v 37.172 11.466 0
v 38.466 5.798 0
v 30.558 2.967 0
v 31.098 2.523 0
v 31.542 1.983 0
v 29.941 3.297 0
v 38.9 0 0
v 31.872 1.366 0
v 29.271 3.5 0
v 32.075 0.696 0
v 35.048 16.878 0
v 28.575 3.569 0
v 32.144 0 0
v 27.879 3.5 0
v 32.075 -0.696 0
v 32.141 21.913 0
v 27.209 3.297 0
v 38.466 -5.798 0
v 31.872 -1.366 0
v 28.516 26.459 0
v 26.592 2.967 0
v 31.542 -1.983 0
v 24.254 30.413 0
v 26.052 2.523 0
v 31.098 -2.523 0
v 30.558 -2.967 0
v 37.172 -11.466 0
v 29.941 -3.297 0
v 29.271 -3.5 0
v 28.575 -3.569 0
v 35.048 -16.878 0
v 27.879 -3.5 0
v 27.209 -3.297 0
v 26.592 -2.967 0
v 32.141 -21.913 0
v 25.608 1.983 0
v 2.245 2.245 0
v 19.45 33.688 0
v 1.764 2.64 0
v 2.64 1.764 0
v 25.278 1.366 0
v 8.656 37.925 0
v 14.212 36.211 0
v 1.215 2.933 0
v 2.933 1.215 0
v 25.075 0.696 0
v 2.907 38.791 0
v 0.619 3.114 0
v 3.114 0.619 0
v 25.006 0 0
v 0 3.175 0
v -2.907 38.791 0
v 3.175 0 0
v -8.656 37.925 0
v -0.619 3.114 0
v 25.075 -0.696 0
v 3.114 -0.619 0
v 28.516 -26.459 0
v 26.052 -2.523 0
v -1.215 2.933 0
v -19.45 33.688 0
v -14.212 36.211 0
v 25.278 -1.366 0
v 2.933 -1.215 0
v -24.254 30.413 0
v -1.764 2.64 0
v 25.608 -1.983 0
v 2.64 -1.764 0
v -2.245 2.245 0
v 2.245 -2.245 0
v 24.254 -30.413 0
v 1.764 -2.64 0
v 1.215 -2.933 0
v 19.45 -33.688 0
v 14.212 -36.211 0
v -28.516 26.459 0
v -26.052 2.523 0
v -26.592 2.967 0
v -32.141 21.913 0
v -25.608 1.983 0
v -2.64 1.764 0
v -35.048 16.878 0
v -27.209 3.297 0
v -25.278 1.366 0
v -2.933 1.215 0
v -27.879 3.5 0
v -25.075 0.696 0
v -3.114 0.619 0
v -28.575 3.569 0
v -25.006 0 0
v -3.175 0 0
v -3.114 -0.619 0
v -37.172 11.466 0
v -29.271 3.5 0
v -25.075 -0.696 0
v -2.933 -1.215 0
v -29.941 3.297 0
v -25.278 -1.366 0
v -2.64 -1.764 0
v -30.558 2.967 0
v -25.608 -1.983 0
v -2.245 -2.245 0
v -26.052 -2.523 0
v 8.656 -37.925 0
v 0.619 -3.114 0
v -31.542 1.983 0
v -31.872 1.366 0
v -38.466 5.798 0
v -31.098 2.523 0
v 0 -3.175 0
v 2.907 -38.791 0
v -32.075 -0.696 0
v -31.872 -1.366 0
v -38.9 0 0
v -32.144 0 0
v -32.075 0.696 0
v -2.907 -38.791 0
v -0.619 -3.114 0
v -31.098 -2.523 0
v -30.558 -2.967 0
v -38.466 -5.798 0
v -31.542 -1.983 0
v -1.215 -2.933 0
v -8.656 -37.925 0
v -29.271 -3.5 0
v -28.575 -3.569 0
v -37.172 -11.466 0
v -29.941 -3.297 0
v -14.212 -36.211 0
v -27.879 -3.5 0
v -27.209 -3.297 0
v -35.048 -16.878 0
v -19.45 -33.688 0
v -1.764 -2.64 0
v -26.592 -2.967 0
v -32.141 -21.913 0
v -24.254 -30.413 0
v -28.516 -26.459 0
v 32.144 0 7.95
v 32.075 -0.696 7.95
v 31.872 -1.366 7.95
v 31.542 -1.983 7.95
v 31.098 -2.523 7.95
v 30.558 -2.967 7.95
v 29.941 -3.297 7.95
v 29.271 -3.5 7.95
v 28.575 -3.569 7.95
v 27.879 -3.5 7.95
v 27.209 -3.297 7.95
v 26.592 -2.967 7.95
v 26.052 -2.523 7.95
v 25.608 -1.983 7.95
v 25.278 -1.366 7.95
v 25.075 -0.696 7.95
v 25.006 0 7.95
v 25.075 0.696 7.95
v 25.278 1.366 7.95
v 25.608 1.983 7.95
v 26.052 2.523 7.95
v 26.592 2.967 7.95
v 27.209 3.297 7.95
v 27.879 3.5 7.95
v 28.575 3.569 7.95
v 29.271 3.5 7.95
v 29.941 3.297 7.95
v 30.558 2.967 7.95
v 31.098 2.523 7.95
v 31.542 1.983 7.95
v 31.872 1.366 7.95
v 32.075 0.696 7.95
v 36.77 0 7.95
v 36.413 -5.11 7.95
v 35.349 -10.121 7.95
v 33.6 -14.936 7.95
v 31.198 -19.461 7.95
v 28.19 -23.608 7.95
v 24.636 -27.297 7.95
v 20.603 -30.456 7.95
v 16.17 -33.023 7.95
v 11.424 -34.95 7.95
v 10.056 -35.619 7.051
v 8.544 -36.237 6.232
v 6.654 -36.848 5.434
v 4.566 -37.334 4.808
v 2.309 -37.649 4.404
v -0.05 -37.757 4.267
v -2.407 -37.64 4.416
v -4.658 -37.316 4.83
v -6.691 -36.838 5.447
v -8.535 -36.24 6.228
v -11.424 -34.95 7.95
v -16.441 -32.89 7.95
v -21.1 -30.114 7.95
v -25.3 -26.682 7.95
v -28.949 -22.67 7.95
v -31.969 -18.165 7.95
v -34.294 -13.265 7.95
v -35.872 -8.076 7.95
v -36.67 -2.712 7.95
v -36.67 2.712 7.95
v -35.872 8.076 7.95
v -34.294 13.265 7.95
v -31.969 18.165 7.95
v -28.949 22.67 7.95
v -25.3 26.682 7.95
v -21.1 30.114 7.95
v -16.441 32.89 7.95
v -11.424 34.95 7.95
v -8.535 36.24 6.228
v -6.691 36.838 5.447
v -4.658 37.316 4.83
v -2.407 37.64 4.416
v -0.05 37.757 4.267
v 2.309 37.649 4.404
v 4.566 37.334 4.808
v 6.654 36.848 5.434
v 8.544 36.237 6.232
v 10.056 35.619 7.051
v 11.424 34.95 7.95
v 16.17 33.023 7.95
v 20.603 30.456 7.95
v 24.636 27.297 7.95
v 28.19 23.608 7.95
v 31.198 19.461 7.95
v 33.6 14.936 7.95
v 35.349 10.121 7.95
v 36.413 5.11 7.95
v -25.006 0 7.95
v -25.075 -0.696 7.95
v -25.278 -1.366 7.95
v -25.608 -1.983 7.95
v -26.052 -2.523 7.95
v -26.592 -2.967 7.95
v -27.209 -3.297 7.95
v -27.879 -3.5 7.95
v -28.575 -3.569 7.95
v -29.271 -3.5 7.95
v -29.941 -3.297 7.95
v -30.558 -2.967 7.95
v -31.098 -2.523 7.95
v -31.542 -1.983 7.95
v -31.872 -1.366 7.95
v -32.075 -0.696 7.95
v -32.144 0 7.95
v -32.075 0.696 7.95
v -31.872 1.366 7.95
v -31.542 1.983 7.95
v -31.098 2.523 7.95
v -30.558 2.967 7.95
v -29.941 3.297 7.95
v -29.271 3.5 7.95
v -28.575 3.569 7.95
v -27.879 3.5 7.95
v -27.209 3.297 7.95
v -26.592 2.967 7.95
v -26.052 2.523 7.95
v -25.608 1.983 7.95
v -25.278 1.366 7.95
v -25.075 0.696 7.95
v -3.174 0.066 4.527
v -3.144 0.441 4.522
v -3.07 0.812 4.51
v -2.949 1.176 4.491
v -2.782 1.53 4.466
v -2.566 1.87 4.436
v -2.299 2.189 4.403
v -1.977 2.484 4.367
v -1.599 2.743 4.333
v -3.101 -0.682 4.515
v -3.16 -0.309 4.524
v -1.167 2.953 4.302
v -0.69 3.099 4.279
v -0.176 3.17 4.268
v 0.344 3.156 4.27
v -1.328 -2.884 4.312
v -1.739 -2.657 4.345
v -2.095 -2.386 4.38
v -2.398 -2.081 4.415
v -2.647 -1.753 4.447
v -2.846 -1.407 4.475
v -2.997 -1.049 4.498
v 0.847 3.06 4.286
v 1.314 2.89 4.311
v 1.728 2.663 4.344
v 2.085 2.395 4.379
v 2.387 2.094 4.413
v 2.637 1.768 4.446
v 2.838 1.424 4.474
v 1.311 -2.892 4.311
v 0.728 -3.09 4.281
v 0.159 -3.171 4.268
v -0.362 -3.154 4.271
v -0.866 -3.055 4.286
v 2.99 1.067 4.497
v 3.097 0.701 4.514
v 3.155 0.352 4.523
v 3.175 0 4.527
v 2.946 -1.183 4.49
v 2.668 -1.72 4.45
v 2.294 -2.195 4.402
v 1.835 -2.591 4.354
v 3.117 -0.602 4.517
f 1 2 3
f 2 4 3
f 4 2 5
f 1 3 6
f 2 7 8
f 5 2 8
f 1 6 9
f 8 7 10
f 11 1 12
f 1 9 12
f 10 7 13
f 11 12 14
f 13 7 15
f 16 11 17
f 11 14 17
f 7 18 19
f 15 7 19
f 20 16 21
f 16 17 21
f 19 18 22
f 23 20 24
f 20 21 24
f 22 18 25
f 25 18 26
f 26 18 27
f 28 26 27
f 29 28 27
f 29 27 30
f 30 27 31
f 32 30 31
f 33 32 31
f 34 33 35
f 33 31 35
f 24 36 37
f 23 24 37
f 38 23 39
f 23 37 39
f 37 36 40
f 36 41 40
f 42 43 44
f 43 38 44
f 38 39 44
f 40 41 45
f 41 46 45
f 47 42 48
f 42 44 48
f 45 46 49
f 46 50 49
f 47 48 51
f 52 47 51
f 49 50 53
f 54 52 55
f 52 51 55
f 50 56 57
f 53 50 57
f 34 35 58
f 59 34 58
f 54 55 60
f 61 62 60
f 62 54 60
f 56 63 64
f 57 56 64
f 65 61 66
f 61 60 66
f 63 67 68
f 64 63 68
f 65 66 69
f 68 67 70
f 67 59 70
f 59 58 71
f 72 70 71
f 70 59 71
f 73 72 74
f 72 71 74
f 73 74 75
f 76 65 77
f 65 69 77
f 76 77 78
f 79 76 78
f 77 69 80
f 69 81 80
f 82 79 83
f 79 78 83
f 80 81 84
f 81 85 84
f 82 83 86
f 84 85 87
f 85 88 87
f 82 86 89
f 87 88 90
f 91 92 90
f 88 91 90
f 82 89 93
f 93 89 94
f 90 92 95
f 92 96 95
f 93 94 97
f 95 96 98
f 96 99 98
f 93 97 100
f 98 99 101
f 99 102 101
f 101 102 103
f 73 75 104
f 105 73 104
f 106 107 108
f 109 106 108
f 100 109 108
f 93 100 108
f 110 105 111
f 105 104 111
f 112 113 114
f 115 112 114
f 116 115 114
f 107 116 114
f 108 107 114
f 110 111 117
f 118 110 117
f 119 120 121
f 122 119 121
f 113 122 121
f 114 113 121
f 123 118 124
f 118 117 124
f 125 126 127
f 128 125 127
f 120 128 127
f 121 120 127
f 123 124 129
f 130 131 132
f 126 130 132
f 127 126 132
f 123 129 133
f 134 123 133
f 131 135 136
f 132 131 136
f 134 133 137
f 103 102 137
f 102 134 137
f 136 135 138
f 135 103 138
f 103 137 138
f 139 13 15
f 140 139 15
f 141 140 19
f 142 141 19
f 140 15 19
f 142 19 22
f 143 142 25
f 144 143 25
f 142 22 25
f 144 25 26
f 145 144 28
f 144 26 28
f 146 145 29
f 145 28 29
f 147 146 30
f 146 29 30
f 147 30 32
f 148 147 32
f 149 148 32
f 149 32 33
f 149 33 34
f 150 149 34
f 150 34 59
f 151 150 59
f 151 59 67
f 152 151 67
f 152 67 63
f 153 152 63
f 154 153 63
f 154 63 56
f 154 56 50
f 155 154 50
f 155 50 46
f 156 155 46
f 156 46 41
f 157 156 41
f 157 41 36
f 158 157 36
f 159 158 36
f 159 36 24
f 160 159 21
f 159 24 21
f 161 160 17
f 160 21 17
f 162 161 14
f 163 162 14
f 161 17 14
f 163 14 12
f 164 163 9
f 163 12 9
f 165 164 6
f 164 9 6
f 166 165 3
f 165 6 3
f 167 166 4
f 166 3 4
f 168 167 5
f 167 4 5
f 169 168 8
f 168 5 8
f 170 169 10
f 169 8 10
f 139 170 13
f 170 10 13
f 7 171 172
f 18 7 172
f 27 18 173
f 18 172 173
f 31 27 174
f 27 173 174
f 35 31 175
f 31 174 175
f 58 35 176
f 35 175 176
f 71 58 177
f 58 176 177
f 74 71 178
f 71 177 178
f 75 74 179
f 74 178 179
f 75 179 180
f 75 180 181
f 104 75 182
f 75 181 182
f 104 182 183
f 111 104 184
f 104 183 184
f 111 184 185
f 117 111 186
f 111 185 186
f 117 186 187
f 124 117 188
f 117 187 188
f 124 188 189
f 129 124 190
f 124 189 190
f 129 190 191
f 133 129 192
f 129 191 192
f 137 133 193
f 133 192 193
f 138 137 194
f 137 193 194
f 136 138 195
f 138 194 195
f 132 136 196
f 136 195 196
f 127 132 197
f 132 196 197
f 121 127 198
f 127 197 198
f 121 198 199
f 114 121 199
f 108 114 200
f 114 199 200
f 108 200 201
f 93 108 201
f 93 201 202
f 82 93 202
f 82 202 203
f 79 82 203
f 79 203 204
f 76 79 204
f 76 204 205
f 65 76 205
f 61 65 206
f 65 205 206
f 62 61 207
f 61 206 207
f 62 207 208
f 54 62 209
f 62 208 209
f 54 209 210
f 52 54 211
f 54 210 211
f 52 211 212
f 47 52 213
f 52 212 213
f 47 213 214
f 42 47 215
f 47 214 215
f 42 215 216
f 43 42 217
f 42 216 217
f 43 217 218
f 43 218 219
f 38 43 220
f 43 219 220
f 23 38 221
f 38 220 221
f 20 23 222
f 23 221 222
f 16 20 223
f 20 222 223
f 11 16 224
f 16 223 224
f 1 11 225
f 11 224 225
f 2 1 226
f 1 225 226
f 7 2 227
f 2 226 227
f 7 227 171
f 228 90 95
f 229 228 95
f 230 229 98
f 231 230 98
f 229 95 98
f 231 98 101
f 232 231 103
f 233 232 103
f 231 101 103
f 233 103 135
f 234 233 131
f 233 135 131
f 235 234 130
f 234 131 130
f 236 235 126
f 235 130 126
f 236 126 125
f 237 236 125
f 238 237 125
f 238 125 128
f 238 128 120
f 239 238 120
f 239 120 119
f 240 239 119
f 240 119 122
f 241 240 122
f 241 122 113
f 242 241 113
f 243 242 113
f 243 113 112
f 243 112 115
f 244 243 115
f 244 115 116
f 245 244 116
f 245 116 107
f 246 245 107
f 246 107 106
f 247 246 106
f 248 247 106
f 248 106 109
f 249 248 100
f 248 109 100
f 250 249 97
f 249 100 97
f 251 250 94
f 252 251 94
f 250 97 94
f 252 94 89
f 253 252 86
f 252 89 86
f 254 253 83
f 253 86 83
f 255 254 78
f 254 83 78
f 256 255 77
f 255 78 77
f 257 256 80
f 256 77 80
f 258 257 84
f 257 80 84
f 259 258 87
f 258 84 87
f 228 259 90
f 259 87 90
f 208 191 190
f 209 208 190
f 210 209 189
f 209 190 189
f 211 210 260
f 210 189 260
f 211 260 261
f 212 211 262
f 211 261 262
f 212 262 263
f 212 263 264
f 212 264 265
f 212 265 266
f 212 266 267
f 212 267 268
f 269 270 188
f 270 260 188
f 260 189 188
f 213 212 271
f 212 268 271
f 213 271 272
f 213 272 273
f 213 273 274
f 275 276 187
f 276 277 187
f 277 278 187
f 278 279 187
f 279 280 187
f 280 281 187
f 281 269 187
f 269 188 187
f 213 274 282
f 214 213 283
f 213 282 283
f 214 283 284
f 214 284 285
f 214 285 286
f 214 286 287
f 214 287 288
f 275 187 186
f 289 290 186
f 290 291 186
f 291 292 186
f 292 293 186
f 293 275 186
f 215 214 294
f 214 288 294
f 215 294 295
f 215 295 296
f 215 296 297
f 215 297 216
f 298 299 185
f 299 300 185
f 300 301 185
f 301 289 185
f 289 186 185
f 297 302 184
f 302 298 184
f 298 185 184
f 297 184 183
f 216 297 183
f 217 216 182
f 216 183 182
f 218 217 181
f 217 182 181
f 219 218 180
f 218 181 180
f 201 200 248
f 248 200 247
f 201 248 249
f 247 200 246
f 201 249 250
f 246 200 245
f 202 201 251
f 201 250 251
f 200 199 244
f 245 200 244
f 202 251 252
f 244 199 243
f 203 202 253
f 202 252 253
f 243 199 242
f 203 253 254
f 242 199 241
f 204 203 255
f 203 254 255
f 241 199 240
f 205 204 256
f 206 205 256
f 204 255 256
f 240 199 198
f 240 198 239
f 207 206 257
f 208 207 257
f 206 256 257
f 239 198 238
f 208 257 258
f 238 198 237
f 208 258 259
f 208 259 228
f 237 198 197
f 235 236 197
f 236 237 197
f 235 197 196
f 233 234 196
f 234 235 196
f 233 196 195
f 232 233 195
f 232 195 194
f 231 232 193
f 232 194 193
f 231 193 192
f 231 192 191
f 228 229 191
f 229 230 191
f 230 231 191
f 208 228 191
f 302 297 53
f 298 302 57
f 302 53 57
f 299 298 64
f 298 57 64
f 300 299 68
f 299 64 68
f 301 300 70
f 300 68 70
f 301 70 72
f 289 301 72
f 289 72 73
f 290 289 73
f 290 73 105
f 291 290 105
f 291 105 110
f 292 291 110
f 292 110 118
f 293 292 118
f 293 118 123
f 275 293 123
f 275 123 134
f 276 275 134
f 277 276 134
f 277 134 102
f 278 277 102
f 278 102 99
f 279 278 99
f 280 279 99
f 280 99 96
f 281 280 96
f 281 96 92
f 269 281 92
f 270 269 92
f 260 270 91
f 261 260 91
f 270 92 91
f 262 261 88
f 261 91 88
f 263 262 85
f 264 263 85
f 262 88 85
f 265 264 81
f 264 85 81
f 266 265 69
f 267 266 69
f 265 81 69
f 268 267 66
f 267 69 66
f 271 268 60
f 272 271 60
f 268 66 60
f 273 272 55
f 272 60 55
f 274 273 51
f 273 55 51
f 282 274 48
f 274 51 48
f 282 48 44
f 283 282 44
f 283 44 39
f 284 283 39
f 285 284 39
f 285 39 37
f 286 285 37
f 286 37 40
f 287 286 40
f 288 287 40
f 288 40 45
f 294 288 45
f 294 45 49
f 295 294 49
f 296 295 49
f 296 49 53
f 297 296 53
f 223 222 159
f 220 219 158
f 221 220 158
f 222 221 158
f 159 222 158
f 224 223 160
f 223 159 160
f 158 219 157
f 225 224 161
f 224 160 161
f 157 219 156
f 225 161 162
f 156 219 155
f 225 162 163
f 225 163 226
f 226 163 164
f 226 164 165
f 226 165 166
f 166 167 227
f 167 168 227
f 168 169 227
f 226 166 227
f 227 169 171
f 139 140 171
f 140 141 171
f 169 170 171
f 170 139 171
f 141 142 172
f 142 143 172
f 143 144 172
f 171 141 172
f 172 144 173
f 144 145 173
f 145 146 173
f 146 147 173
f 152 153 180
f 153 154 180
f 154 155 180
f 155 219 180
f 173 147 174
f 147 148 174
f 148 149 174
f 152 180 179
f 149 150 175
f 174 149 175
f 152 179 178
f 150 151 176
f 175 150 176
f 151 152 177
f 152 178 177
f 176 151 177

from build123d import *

# Parameters (mm, degrees)
F3_DEPTH      = 38.9011
F3_DEPTH_BACK = 38.9011
F4_R          = 3.175
F4_R_2        = 3.5687
F5_DEPTH      = 7.9512001


with BuildPart() as f1:
    # F0 (on Front) → F1 (revolve)
    with BuildSketch(Plane.XZ):
        Polygon((36.7698503303, 7.9502), (0, 7.9502), (0, 0), (38.9001, 0), align=None)
    revolve(axis=Axis((0, 0, 3.9751), (0, 0, -1)))

    # F2 (on Front) → F3 (cut, two sides)
    with BuildSketch(Plane.XZ) as f3_sk:
        with BuildLine():
            Line((11.4236482351, 7.9502), (-11.4236482351, 7.9502))
            ThreePointArc((-11.4236482351, 7.9502), (0, 4.2672), (11.4236482351, 7.9502))
        make_face()
    extrude(amount=-F3_DEPTH, mode=Mode.SUBTRACT)
    extrude(f3_sk.sketch, amount=F3_DEPTH_BACK, mode=Mode.SUBTRACT)

    # F4 (on face) → F5 (cut, through all)
    with BuildSketch(Plane(origin=(0, 0, 0), x_dir=(1, 0, 0), z_dir=(0, 0, -1))):
        Circle(F4_R)
        with Locations((-28.575, 0)):
            Circle(F4_R_2)
        with Locations((28.575, 0)):
            Circle(F4_R_2)
    extrude(amount=-F5_DEPTH, mode=Mode.SUBTRACT)


solid = f1.part
